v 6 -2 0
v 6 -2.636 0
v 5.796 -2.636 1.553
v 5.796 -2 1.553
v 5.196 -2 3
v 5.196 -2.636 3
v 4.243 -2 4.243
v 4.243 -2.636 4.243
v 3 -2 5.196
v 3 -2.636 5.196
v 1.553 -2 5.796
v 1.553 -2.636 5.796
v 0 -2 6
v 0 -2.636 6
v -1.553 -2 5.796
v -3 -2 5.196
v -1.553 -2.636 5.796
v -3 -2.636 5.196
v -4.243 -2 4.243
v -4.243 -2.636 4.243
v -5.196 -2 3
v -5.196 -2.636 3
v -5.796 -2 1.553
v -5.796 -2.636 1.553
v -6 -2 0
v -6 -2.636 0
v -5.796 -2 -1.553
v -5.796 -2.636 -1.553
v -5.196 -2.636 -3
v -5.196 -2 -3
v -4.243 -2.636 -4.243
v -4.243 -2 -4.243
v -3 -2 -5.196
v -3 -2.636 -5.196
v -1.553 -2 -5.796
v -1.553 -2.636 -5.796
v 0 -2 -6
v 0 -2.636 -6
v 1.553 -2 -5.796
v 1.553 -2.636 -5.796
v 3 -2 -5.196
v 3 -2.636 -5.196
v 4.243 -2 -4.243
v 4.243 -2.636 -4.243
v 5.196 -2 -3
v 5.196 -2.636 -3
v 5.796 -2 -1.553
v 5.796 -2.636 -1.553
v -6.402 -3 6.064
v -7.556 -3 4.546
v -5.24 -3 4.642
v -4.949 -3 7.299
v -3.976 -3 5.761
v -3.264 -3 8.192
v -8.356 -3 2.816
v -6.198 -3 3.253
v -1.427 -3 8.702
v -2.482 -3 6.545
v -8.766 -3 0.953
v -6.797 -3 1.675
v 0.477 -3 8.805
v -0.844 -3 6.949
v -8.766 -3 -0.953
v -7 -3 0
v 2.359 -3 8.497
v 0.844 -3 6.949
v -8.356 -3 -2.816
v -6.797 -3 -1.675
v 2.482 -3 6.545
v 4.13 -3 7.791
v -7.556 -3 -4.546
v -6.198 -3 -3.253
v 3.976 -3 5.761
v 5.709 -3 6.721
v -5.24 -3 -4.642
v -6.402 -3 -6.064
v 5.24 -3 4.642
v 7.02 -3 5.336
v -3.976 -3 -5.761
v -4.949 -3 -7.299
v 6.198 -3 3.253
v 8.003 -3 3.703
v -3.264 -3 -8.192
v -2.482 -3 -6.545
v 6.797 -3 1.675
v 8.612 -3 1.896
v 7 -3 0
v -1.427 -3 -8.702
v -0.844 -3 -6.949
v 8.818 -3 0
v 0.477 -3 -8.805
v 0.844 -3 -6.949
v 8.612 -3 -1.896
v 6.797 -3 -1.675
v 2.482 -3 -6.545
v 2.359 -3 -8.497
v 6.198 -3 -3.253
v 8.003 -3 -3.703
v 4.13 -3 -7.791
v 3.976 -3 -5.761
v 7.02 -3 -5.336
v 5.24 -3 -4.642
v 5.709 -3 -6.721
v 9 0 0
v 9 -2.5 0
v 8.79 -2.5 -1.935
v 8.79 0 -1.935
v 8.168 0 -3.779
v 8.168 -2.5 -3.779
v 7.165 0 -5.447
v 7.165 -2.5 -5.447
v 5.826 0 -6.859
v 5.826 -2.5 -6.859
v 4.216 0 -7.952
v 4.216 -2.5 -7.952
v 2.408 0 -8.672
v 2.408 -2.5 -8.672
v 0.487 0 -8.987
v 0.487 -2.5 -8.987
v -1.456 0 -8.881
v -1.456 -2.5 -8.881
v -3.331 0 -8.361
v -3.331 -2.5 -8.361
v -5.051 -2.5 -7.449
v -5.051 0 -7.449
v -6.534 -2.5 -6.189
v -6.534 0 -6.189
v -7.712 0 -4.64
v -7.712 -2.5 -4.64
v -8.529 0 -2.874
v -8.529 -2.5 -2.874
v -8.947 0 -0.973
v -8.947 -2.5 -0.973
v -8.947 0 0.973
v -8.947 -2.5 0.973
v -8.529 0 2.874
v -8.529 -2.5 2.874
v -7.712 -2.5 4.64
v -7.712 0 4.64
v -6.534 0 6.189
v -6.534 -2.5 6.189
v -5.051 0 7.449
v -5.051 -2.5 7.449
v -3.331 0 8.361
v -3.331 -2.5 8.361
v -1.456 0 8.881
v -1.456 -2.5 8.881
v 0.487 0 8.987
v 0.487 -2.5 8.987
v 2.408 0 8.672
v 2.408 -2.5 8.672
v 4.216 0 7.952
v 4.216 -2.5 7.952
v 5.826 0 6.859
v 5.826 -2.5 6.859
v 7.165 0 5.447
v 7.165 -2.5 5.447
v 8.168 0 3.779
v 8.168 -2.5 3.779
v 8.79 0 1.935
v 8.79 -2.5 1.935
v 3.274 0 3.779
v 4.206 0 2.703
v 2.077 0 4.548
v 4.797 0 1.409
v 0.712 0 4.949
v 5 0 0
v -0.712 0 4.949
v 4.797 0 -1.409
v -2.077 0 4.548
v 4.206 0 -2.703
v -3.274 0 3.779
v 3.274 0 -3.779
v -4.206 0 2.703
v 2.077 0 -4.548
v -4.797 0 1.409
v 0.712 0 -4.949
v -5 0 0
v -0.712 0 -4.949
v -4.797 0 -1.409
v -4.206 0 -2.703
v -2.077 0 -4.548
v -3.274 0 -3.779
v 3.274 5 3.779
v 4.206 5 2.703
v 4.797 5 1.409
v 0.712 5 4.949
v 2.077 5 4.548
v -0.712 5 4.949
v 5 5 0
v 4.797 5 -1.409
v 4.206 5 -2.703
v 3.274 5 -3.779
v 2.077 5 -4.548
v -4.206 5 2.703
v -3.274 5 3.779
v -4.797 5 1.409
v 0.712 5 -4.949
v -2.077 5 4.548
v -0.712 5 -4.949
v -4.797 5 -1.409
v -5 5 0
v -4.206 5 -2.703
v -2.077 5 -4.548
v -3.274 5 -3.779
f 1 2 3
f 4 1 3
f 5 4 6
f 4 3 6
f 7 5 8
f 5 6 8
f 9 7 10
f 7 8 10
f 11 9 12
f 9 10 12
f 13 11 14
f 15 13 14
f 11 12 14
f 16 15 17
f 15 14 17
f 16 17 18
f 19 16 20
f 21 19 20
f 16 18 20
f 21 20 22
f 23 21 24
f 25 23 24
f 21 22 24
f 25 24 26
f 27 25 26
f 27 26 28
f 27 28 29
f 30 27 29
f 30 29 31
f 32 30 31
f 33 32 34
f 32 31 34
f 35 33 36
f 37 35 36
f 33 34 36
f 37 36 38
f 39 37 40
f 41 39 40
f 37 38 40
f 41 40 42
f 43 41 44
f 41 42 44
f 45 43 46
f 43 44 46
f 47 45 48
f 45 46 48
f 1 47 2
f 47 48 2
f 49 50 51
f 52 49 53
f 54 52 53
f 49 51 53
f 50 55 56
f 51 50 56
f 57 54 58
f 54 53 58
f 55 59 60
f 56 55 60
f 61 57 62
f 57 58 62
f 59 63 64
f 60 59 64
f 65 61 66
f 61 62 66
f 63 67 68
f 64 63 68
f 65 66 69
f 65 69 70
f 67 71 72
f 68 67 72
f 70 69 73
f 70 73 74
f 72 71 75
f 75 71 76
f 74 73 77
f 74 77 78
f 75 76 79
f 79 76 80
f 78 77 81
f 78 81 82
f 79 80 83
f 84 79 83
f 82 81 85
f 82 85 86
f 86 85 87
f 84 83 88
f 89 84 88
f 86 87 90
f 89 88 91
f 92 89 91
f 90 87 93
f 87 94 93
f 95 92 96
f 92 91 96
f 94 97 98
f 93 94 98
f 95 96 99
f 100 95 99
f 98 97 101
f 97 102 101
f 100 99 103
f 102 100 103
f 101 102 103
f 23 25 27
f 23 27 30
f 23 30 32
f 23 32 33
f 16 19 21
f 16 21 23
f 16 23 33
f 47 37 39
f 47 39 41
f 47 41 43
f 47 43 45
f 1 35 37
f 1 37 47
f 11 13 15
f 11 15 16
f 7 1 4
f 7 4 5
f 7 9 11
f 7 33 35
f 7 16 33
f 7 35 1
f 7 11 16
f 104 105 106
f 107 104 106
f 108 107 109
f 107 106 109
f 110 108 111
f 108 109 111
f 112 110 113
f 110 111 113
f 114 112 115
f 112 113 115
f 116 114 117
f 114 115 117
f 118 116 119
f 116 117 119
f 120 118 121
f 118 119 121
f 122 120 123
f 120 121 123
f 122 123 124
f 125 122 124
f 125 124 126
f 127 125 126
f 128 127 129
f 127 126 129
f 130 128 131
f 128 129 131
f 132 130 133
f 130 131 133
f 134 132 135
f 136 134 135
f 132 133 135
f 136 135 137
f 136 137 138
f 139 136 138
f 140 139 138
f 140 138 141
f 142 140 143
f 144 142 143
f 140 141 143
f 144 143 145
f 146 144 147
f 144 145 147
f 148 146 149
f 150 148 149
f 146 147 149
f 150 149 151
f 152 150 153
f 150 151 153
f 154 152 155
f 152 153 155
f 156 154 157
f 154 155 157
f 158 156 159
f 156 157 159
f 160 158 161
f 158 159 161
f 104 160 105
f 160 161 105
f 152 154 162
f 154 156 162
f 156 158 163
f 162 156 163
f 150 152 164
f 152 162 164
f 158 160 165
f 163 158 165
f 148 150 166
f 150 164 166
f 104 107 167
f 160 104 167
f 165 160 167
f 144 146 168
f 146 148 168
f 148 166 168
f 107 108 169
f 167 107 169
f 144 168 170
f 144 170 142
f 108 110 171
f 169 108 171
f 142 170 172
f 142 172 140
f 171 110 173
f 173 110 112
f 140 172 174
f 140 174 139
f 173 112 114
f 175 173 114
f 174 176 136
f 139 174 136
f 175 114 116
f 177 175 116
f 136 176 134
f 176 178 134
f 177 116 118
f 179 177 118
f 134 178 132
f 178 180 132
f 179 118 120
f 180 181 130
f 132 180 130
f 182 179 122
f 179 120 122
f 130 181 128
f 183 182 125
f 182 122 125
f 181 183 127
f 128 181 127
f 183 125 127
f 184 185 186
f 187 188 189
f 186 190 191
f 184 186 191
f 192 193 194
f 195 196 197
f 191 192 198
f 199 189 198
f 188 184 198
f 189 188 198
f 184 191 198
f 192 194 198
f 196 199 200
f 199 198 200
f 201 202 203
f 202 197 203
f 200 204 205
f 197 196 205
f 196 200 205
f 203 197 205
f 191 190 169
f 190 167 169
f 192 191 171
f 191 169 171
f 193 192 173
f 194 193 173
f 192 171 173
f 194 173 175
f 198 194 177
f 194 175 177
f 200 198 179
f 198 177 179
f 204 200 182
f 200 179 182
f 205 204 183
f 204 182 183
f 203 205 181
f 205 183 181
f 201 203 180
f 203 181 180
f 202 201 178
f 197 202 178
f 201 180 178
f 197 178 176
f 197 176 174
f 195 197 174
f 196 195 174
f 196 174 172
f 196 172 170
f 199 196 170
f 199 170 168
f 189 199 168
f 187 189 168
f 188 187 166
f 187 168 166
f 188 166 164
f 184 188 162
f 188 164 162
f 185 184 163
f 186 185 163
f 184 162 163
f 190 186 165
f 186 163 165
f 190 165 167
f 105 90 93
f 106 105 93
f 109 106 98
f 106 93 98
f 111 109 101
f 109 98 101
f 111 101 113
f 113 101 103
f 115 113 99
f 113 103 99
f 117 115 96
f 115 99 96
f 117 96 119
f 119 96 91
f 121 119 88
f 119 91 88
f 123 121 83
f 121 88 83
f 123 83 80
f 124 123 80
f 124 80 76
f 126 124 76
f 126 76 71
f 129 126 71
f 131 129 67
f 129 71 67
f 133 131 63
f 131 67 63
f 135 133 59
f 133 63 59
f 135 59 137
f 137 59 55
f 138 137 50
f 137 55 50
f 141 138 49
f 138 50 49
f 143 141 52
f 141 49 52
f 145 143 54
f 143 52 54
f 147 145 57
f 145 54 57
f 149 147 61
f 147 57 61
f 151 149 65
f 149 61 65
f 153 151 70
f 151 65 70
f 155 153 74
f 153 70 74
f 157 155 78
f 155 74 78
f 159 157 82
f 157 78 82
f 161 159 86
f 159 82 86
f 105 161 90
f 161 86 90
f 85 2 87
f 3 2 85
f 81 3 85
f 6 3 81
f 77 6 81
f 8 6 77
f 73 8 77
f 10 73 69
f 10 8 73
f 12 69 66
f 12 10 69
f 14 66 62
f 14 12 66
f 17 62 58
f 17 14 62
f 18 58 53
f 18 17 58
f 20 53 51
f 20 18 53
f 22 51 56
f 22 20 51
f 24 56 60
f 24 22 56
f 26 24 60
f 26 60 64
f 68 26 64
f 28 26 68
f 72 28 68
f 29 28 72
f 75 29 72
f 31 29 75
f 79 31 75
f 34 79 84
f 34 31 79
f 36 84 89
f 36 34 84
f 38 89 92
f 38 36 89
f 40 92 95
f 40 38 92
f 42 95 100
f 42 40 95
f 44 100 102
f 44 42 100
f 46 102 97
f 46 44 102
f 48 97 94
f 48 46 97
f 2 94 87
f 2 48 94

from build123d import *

# Parameters (mm, degrees)
SKETCH_3_R          = 6
CUT_EXTRUDE_1_DEPTH = 1
CHAMFER_1_SIZE      = 1
CHAMFER_1_SIZE2     = 0.363970234
CHAMFER_2_SIZE      = 0.5
CHAMFER_2_SIZE2     = 0.181985117


with BuildPart() as part:
    # Эскиз1 → Повернуть1 (revolve)
    with BuildSketch(Plane.XY):
        Polygon((0, 0), (0, 5), (5, 5), (5, 0), (9, 0), (9, -3), (0, -3), align=None)
    revolve(axis=Axis((0, 0, 0), (0, 1, 0)))

    # Эскиз3 → Вырез-Вытянуть1 (cut)
    with BuildSketch(Plane.XZ.offset(3)):
        Circle(SKETCH_3_R)
    extrude(amount=-CUT_EXTRUDE_1_DEPTH, mode=Mode.SUBTRACT)

    # Фаска1
    chamfer_1_edges = [part.edges().sort_by_distance(p)[0] for p in [
        (-6, -3, 0),
    ]]
    chamfer_1_side = [part.faces().sort_by_distance(p)[0] for p in [
        (-8.745441559, -3, 0),
    ]]
    chamfer(chamfer_1_edges, length=CHAMFER_1_SIZE, length2=CHAMFER_1_SIZE2, reference=chamfer_1_side[0])

    # Фаска2
    chamfer_2_edges = [part.edges().sort_by_distance(p)[0] for p in [
        (-9, -3, 0),
    ]]
    chamfer_2_side = [part.faces().sort_by_distance(p)[0] for p in [
        (-9, -1.5, 0),
    ]]
    chamfer(chamfer_2_edges, length=CHAMFER_2_SIZE, length2=CHAMFER_2_SIZE2, reference=chamfer_2_side[0])


solid = part.part
